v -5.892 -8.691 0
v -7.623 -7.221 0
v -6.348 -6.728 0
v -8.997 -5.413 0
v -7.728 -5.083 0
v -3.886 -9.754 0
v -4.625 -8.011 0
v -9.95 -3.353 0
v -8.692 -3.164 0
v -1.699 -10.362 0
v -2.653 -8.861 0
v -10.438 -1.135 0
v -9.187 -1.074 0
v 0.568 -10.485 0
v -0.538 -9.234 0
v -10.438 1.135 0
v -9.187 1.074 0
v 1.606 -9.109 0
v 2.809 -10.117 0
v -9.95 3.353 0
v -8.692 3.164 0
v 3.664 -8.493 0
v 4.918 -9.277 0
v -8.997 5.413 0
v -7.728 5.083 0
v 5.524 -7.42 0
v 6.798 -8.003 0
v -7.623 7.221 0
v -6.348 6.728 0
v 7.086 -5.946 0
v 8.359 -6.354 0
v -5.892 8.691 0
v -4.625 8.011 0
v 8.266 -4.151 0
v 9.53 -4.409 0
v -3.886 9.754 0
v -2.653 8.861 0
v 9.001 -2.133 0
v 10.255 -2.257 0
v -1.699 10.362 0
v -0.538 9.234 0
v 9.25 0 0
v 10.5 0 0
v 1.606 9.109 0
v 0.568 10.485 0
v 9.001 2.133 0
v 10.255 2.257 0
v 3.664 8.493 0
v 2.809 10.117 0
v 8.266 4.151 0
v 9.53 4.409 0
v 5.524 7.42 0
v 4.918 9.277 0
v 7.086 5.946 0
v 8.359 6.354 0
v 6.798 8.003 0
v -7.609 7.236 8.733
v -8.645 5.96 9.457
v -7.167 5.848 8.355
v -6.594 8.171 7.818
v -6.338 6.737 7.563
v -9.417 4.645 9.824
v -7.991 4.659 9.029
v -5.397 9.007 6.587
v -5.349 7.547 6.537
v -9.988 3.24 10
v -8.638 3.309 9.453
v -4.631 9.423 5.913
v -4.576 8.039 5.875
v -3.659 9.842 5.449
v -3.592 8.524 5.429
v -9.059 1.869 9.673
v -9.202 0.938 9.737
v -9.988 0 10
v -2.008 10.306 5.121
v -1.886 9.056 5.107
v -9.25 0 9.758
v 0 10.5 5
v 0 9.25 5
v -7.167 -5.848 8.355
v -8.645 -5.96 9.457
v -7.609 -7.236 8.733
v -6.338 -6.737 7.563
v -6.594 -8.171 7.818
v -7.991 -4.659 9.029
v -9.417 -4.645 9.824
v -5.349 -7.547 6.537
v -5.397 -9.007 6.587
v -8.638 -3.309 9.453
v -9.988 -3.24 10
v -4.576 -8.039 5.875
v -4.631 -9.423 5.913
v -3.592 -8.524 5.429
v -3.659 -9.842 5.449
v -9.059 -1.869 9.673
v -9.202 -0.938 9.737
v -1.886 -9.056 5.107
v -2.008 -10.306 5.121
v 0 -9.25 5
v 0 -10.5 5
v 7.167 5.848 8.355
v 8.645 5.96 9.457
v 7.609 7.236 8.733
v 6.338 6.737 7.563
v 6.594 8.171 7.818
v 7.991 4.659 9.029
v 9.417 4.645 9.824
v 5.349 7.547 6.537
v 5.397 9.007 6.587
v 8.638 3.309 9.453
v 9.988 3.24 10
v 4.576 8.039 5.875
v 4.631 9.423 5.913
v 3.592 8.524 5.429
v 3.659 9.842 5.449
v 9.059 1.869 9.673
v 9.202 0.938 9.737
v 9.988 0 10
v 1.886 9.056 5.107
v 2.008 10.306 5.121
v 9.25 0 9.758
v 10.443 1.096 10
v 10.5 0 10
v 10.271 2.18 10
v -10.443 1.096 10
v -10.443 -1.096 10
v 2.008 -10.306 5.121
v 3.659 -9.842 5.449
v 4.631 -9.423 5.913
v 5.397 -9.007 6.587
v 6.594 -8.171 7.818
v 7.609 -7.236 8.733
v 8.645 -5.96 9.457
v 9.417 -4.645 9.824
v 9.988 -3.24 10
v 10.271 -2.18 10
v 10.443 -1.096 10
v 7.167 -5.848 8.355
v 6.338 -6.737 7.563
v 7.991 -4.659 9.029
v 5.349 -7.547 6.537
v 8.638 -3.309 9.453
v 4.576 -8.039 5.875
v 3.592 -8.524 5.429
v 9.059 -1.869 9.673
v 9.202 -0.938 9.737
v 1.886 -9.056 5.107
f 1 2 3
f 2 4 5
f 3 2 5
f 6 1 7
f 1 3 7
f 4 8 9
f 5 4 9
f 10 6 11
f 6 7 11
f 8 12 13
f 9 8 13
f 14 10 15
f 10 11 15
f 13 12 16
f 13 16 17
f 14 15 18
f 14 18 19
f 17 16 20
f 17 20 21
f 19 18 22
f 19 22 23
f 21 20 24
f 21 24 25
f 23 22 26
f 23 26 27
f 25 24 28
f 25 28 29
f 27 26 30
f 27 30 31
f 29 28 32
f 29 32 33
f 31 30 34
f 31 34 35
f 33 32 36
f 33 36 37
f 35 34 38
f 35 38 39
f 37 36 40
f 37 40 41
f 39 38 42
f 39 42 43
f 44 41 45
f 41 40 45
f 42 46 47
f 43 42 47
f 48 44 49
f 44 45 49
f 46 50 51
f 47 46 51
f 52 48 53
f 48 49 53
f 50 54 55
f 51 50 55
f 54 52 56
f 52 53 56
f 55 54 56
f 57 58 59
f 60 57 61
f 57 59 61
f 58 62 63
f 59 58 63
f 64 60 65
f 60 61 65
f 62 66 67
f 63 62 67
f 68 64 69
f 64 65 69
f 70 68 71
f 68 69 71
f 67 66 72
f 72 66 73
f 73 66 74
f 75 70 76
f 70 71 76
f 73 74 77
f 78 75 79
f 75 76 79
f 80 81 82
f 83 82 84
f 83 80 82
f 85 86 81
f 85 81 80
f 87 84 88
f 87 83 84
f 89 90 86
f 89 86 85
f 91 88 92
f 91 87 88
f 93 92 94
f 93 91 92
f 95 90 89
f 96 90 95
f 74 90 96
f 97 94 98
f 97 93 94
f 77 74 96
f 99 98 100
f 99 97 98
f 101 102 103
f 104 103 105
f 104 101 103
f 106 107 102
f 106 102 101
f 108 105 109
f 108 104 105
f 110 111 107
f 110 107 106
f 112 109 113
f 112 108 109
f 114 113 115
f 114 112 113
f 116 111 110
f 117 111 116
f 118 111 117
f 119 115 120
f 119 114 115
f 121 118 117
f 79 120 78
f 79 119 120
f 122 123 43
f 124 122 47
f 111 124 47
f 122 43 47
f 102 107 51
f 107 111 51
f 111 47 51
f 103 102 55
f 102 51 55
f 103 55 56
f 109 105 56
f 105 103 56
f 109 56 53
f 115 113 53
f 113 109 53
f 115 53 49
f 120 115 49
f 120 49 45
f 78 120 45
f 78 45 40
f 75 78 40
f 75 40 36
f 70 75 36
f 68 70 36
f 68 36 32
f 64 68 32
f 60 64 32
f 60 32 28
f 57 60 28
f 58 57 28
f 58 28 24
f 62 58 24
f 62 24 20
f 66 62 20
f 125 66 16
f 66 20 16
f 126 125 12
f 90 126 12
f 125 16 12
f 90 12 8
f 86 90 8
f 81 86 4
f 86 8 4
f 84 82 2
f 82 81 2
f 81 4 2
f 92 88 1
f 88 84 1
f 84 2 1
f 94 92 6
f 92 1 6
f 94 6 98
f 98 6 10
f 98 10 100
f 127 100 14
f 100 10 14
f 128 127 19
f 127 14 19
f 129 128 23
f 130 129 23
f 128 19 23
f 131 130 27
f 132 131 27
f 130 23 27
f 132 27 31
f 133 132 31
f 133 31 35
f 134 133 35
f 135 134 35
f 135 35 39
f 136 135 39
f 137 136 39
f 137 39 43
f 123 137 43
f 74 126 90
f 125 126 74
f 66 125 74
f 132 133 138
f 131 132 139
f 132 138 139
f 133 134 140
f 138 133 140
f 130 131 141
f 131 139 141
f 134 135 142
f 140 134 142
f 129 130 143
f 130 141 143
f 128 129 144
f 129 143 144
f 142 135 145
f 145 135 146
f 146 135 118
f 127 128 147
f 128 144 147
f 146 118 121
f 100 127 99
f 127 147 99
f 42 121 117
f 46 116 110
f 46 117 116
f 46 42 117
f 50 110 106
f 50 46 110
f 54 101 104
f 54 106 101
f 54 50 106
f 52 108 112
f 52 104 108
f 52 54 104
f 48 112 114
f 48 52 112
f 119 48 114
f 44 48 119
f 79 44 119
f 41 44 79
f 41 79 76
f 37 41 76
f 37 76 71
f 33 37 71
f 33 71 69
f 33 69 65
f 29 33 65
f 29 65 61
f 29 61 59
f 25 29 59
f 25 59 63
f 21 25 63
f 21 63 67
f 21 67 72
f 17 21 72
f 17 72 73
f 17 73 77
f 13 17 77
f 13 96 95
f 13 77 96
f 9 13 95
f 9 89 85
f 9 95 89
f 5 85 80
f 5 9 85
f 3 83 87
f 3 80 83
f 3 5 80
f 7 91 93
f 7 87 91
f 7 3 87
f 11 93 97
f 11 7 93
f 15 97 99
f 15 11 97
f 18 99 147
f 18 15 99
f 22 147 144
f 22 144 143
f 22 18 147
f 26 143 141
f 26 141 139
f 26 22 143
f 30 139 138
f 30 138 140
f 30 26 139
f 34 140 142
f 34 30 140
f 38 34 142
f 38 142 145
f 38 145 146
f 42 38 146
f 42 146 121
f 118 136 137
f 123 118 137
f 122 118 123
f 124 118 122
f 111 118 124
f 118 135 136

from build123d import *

# Parameters (mm, degrees)
F0_R     = 10.5
F0_R_2   = 9.25
F1_DEPTH = 10
F3_DEPTH = 12.5


with BuildPart() as f1:
    # F0 (on Top) → F1 (new body)
    with BuildSketch(Plane.XY):
        Circle(F0_R)
        Circle(F0_R_2, mode=Mode.SUBTRACT)
    extrude(amount=F1_DEPTH)

    # F2 (on Front) → F3 (cut, symmetric)
    with BuildSketch(Plane.XZ):
        with BuildLine():
            add(Edge.make_bspline(
                [(11.2434588373, 10.0891618058), (11.0047016615, 10.1132977758), (10.7632299901, 10.112965479), (10.5204237755, 10.0891618058)],
                knots=[0, 0, 0, 0, 0.0562635786, 0.0562635786, 0.0562635786, 0.0562635786], degree=3))
            Line((10.5204237755, 10.0891618058), (11.2434588373, 10.0891618058))
        make_face()
        with BuildLine():
            Line((10.5204237755, 10.0891618058), (-10.5204237755, 10.0891618058))
            add(Edge.make_bspline(
                [(-10.5204237755, 10.0891618058), (-9.8416288611, 10.0226156826), (-8.0921208581, 9.3880562532), (-5.7194913073, 6.93683362), (-4.2906021774, 5.397823396), (-1.4143970077, 5.0322200394), (-0.6250849692, 5.0027752295), (0, 5)],
                knots=[0.0562635786, 0.0562635786, 0.0562635786, 0.0562635786, 0.2135553971, 0.4555283654, 0.6401415553, 0.844289529, 1, 1, 1, 1], degree=3))
            add(Edge.make_bspline(
                [(10.5204237755, 10.0891618058), (9.8416288611, 10.0226156826), (8.0921208581, 9.3880562532), (5.7194913073, 6.93683362), (4.2906021774, 5.397823396), (1.4143970077, 5.0322200394), (0.6250849692, 5.0027752295), (0, 5)],
                knots=[0.0562635786, 0.0562635786, 0.0562635786, 0.0562635786, 0.2135553971, 0.4555283654, 0.6401415553, 0.844289529, 1, 1, 1, 1], degree=3))
        make_face()
        with BuildLine():
            add(Edge.make_bspline(
                [(-11.2434588373, 10.0891618058), (-11.0047016615, 10.1132977758), (-10.7632299901, 10.112965479), (-10.5204237755, 10.0891618058)],
                knots=[0, 0, 0, 0, 0.0562635786, 0.0562635786, 0.0562635786, 0.0562635786], degree=3))
            Line((-11.2434588373, 10.0891618058), (-10.5204237755, 10.0891618058))
        make_face()
    extrude(amount=F3_DEPTH, both=True, mode=Mode.SUBTRACT)


solid = f1.part
